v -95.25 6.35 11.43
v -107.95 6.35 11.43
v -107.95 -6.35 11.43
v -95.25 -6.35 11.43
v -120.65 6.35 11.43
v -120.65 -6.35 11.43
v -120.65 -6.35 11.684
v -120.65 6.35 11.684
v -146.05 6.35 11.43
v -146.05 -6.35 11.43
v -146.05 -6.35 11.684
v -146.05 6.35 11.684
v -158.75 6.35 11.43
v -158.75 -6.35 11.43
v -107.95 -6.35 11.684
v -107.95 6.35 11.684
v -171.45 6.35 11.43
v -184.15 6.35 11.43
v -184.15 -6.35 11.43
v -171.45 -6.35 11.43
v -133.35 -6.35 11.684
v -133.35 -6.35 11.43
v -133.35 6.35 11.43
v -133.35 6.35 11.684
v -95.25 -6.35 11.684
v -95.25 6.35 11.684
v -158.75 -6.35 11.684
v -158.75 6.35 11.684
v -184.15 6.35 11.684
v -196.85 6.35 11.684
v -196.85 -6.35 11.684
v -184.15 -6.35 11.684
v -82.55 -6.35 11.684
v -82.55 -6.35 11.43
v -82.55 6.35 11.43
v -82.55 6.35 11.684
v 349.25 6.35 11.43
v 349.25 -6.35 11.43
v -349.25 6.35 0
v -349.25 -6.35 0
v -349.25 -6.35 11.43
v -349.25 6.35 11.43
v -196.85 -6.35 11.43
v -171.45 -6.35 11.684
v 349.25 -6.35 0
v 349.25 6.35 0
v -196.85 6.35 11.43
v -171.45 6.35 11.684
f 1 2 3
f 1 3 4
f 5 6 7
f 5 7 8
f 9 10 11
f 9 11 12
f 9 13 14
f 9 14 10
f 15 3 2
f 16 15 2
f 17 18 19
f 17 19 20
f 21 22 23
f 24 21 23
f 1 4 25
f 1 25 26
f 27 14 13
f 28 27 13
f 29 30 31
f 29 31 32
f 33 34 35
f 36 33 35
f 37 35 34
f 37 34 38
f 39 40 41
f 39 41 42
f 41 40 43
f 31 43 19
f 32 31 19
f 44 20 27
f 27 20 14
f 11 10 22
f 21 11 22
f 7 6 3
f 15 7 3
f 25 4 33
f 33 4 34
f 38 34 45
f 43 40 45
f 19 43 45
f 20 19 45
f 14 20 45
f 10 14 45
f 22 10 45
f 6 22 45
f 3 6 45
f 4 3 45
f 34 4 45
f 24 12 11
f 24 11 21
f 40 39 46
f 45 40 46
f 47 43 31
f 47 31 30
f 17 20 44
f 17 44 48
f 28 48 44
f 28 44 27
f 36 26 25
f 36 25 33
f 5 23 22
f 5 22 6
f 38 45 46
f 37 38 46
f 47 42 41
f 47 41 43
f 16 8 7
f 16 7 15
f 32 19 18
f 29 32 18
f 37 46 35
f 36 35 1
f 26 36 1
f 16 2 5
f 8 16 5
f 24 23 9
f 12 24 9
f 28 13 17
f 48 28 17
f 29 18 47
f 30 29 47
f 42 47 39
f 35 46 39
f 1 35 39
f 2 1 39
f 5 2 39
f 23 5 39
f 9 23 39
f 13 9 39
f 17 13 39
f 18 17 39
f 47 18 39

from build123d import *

# Parameters (mm, degrees)
F0_W     = 152.4
F0_H     = 12.7
F0_W_2   = 12.7
F0_W_3   = 368.3
F1_DEPTH = 11.43
F2_DEPTH = 11.684


with BuildPart() as f1:
    # F0 (on Top) → F1 (new body)
    with BuildSketch(Plane.XY):
        with Locations((-273.05, 0)):
            Rectangle(F0_W, F0_H)
        with Locations((-190.5, 0)):
            Rectangle(F0_W_2, F0_H)
        with Locations((-177.8, 0)):
            Rectangle(F0_W_2, F0_H)
        with Locations((-165.1, 0)):
            Rectangle(F0_W_2, F0_H)
        with Locations((-152.4, 0)):
            Rectangle(F0_W_2, F0_H)
        with Locations((-139.7, 0)):
            Rectangle(F0_W_2, F0_H)
        with Locations((-127, 0)):
            Rectangle(F0_W_2, F0_H)
        with Locations((-114.3, 0)):
            Rectangle(F0_W_2, F0_H)
        with Locations((-101.6, 0)):
            Rectangle(F0_W_2, F0_H)
        with Locations((-88.9, 0)):
            Rectangle(F0_W_2, F0_H)
        with Locations((-76.2, 0)):
            Rectangle(F0_W_2, F0_H)
        with Locations((-63.5, 0)):
            Rectangle(F0_W_2, F0_H)
        with Locations((-50.8, 0)):
            Rectangle(F0_W_2, F0_H)
        with Locations((-38.1, 0)):
            Rectangle(F0_W_2, F0_H)
        with Locations((-25.4, 0)):
            Rectangle(F0_W_2, F0_H)
        with Locations((165.1, 0)):
            Rectangle(F0_W_3, F0_H)
    extrude(amount=F1_DEPTH)

    # F0 (on Top) → F2 (join)
    with BuildSketch(Plane.XY):
        with Locations((-190.5, 0)):
            Rectangle(F0_W_2, F0_H)
        with Locations((-165.1, 0)):
            Rectangle(F0_W_2, F0_H)
        with Locations((-139.7, 0)):
            Rectangle(F0_W_2, F0_H)
        with Locations((-114.3, 0)):
            Rectangle(F0_W_2, F0_H)
        with Locations((-88.9, 0)):
            Rectangle(F0_W_2, F0_H)
    extrude(amount=F2_DEPTH)


solid = f1.part
